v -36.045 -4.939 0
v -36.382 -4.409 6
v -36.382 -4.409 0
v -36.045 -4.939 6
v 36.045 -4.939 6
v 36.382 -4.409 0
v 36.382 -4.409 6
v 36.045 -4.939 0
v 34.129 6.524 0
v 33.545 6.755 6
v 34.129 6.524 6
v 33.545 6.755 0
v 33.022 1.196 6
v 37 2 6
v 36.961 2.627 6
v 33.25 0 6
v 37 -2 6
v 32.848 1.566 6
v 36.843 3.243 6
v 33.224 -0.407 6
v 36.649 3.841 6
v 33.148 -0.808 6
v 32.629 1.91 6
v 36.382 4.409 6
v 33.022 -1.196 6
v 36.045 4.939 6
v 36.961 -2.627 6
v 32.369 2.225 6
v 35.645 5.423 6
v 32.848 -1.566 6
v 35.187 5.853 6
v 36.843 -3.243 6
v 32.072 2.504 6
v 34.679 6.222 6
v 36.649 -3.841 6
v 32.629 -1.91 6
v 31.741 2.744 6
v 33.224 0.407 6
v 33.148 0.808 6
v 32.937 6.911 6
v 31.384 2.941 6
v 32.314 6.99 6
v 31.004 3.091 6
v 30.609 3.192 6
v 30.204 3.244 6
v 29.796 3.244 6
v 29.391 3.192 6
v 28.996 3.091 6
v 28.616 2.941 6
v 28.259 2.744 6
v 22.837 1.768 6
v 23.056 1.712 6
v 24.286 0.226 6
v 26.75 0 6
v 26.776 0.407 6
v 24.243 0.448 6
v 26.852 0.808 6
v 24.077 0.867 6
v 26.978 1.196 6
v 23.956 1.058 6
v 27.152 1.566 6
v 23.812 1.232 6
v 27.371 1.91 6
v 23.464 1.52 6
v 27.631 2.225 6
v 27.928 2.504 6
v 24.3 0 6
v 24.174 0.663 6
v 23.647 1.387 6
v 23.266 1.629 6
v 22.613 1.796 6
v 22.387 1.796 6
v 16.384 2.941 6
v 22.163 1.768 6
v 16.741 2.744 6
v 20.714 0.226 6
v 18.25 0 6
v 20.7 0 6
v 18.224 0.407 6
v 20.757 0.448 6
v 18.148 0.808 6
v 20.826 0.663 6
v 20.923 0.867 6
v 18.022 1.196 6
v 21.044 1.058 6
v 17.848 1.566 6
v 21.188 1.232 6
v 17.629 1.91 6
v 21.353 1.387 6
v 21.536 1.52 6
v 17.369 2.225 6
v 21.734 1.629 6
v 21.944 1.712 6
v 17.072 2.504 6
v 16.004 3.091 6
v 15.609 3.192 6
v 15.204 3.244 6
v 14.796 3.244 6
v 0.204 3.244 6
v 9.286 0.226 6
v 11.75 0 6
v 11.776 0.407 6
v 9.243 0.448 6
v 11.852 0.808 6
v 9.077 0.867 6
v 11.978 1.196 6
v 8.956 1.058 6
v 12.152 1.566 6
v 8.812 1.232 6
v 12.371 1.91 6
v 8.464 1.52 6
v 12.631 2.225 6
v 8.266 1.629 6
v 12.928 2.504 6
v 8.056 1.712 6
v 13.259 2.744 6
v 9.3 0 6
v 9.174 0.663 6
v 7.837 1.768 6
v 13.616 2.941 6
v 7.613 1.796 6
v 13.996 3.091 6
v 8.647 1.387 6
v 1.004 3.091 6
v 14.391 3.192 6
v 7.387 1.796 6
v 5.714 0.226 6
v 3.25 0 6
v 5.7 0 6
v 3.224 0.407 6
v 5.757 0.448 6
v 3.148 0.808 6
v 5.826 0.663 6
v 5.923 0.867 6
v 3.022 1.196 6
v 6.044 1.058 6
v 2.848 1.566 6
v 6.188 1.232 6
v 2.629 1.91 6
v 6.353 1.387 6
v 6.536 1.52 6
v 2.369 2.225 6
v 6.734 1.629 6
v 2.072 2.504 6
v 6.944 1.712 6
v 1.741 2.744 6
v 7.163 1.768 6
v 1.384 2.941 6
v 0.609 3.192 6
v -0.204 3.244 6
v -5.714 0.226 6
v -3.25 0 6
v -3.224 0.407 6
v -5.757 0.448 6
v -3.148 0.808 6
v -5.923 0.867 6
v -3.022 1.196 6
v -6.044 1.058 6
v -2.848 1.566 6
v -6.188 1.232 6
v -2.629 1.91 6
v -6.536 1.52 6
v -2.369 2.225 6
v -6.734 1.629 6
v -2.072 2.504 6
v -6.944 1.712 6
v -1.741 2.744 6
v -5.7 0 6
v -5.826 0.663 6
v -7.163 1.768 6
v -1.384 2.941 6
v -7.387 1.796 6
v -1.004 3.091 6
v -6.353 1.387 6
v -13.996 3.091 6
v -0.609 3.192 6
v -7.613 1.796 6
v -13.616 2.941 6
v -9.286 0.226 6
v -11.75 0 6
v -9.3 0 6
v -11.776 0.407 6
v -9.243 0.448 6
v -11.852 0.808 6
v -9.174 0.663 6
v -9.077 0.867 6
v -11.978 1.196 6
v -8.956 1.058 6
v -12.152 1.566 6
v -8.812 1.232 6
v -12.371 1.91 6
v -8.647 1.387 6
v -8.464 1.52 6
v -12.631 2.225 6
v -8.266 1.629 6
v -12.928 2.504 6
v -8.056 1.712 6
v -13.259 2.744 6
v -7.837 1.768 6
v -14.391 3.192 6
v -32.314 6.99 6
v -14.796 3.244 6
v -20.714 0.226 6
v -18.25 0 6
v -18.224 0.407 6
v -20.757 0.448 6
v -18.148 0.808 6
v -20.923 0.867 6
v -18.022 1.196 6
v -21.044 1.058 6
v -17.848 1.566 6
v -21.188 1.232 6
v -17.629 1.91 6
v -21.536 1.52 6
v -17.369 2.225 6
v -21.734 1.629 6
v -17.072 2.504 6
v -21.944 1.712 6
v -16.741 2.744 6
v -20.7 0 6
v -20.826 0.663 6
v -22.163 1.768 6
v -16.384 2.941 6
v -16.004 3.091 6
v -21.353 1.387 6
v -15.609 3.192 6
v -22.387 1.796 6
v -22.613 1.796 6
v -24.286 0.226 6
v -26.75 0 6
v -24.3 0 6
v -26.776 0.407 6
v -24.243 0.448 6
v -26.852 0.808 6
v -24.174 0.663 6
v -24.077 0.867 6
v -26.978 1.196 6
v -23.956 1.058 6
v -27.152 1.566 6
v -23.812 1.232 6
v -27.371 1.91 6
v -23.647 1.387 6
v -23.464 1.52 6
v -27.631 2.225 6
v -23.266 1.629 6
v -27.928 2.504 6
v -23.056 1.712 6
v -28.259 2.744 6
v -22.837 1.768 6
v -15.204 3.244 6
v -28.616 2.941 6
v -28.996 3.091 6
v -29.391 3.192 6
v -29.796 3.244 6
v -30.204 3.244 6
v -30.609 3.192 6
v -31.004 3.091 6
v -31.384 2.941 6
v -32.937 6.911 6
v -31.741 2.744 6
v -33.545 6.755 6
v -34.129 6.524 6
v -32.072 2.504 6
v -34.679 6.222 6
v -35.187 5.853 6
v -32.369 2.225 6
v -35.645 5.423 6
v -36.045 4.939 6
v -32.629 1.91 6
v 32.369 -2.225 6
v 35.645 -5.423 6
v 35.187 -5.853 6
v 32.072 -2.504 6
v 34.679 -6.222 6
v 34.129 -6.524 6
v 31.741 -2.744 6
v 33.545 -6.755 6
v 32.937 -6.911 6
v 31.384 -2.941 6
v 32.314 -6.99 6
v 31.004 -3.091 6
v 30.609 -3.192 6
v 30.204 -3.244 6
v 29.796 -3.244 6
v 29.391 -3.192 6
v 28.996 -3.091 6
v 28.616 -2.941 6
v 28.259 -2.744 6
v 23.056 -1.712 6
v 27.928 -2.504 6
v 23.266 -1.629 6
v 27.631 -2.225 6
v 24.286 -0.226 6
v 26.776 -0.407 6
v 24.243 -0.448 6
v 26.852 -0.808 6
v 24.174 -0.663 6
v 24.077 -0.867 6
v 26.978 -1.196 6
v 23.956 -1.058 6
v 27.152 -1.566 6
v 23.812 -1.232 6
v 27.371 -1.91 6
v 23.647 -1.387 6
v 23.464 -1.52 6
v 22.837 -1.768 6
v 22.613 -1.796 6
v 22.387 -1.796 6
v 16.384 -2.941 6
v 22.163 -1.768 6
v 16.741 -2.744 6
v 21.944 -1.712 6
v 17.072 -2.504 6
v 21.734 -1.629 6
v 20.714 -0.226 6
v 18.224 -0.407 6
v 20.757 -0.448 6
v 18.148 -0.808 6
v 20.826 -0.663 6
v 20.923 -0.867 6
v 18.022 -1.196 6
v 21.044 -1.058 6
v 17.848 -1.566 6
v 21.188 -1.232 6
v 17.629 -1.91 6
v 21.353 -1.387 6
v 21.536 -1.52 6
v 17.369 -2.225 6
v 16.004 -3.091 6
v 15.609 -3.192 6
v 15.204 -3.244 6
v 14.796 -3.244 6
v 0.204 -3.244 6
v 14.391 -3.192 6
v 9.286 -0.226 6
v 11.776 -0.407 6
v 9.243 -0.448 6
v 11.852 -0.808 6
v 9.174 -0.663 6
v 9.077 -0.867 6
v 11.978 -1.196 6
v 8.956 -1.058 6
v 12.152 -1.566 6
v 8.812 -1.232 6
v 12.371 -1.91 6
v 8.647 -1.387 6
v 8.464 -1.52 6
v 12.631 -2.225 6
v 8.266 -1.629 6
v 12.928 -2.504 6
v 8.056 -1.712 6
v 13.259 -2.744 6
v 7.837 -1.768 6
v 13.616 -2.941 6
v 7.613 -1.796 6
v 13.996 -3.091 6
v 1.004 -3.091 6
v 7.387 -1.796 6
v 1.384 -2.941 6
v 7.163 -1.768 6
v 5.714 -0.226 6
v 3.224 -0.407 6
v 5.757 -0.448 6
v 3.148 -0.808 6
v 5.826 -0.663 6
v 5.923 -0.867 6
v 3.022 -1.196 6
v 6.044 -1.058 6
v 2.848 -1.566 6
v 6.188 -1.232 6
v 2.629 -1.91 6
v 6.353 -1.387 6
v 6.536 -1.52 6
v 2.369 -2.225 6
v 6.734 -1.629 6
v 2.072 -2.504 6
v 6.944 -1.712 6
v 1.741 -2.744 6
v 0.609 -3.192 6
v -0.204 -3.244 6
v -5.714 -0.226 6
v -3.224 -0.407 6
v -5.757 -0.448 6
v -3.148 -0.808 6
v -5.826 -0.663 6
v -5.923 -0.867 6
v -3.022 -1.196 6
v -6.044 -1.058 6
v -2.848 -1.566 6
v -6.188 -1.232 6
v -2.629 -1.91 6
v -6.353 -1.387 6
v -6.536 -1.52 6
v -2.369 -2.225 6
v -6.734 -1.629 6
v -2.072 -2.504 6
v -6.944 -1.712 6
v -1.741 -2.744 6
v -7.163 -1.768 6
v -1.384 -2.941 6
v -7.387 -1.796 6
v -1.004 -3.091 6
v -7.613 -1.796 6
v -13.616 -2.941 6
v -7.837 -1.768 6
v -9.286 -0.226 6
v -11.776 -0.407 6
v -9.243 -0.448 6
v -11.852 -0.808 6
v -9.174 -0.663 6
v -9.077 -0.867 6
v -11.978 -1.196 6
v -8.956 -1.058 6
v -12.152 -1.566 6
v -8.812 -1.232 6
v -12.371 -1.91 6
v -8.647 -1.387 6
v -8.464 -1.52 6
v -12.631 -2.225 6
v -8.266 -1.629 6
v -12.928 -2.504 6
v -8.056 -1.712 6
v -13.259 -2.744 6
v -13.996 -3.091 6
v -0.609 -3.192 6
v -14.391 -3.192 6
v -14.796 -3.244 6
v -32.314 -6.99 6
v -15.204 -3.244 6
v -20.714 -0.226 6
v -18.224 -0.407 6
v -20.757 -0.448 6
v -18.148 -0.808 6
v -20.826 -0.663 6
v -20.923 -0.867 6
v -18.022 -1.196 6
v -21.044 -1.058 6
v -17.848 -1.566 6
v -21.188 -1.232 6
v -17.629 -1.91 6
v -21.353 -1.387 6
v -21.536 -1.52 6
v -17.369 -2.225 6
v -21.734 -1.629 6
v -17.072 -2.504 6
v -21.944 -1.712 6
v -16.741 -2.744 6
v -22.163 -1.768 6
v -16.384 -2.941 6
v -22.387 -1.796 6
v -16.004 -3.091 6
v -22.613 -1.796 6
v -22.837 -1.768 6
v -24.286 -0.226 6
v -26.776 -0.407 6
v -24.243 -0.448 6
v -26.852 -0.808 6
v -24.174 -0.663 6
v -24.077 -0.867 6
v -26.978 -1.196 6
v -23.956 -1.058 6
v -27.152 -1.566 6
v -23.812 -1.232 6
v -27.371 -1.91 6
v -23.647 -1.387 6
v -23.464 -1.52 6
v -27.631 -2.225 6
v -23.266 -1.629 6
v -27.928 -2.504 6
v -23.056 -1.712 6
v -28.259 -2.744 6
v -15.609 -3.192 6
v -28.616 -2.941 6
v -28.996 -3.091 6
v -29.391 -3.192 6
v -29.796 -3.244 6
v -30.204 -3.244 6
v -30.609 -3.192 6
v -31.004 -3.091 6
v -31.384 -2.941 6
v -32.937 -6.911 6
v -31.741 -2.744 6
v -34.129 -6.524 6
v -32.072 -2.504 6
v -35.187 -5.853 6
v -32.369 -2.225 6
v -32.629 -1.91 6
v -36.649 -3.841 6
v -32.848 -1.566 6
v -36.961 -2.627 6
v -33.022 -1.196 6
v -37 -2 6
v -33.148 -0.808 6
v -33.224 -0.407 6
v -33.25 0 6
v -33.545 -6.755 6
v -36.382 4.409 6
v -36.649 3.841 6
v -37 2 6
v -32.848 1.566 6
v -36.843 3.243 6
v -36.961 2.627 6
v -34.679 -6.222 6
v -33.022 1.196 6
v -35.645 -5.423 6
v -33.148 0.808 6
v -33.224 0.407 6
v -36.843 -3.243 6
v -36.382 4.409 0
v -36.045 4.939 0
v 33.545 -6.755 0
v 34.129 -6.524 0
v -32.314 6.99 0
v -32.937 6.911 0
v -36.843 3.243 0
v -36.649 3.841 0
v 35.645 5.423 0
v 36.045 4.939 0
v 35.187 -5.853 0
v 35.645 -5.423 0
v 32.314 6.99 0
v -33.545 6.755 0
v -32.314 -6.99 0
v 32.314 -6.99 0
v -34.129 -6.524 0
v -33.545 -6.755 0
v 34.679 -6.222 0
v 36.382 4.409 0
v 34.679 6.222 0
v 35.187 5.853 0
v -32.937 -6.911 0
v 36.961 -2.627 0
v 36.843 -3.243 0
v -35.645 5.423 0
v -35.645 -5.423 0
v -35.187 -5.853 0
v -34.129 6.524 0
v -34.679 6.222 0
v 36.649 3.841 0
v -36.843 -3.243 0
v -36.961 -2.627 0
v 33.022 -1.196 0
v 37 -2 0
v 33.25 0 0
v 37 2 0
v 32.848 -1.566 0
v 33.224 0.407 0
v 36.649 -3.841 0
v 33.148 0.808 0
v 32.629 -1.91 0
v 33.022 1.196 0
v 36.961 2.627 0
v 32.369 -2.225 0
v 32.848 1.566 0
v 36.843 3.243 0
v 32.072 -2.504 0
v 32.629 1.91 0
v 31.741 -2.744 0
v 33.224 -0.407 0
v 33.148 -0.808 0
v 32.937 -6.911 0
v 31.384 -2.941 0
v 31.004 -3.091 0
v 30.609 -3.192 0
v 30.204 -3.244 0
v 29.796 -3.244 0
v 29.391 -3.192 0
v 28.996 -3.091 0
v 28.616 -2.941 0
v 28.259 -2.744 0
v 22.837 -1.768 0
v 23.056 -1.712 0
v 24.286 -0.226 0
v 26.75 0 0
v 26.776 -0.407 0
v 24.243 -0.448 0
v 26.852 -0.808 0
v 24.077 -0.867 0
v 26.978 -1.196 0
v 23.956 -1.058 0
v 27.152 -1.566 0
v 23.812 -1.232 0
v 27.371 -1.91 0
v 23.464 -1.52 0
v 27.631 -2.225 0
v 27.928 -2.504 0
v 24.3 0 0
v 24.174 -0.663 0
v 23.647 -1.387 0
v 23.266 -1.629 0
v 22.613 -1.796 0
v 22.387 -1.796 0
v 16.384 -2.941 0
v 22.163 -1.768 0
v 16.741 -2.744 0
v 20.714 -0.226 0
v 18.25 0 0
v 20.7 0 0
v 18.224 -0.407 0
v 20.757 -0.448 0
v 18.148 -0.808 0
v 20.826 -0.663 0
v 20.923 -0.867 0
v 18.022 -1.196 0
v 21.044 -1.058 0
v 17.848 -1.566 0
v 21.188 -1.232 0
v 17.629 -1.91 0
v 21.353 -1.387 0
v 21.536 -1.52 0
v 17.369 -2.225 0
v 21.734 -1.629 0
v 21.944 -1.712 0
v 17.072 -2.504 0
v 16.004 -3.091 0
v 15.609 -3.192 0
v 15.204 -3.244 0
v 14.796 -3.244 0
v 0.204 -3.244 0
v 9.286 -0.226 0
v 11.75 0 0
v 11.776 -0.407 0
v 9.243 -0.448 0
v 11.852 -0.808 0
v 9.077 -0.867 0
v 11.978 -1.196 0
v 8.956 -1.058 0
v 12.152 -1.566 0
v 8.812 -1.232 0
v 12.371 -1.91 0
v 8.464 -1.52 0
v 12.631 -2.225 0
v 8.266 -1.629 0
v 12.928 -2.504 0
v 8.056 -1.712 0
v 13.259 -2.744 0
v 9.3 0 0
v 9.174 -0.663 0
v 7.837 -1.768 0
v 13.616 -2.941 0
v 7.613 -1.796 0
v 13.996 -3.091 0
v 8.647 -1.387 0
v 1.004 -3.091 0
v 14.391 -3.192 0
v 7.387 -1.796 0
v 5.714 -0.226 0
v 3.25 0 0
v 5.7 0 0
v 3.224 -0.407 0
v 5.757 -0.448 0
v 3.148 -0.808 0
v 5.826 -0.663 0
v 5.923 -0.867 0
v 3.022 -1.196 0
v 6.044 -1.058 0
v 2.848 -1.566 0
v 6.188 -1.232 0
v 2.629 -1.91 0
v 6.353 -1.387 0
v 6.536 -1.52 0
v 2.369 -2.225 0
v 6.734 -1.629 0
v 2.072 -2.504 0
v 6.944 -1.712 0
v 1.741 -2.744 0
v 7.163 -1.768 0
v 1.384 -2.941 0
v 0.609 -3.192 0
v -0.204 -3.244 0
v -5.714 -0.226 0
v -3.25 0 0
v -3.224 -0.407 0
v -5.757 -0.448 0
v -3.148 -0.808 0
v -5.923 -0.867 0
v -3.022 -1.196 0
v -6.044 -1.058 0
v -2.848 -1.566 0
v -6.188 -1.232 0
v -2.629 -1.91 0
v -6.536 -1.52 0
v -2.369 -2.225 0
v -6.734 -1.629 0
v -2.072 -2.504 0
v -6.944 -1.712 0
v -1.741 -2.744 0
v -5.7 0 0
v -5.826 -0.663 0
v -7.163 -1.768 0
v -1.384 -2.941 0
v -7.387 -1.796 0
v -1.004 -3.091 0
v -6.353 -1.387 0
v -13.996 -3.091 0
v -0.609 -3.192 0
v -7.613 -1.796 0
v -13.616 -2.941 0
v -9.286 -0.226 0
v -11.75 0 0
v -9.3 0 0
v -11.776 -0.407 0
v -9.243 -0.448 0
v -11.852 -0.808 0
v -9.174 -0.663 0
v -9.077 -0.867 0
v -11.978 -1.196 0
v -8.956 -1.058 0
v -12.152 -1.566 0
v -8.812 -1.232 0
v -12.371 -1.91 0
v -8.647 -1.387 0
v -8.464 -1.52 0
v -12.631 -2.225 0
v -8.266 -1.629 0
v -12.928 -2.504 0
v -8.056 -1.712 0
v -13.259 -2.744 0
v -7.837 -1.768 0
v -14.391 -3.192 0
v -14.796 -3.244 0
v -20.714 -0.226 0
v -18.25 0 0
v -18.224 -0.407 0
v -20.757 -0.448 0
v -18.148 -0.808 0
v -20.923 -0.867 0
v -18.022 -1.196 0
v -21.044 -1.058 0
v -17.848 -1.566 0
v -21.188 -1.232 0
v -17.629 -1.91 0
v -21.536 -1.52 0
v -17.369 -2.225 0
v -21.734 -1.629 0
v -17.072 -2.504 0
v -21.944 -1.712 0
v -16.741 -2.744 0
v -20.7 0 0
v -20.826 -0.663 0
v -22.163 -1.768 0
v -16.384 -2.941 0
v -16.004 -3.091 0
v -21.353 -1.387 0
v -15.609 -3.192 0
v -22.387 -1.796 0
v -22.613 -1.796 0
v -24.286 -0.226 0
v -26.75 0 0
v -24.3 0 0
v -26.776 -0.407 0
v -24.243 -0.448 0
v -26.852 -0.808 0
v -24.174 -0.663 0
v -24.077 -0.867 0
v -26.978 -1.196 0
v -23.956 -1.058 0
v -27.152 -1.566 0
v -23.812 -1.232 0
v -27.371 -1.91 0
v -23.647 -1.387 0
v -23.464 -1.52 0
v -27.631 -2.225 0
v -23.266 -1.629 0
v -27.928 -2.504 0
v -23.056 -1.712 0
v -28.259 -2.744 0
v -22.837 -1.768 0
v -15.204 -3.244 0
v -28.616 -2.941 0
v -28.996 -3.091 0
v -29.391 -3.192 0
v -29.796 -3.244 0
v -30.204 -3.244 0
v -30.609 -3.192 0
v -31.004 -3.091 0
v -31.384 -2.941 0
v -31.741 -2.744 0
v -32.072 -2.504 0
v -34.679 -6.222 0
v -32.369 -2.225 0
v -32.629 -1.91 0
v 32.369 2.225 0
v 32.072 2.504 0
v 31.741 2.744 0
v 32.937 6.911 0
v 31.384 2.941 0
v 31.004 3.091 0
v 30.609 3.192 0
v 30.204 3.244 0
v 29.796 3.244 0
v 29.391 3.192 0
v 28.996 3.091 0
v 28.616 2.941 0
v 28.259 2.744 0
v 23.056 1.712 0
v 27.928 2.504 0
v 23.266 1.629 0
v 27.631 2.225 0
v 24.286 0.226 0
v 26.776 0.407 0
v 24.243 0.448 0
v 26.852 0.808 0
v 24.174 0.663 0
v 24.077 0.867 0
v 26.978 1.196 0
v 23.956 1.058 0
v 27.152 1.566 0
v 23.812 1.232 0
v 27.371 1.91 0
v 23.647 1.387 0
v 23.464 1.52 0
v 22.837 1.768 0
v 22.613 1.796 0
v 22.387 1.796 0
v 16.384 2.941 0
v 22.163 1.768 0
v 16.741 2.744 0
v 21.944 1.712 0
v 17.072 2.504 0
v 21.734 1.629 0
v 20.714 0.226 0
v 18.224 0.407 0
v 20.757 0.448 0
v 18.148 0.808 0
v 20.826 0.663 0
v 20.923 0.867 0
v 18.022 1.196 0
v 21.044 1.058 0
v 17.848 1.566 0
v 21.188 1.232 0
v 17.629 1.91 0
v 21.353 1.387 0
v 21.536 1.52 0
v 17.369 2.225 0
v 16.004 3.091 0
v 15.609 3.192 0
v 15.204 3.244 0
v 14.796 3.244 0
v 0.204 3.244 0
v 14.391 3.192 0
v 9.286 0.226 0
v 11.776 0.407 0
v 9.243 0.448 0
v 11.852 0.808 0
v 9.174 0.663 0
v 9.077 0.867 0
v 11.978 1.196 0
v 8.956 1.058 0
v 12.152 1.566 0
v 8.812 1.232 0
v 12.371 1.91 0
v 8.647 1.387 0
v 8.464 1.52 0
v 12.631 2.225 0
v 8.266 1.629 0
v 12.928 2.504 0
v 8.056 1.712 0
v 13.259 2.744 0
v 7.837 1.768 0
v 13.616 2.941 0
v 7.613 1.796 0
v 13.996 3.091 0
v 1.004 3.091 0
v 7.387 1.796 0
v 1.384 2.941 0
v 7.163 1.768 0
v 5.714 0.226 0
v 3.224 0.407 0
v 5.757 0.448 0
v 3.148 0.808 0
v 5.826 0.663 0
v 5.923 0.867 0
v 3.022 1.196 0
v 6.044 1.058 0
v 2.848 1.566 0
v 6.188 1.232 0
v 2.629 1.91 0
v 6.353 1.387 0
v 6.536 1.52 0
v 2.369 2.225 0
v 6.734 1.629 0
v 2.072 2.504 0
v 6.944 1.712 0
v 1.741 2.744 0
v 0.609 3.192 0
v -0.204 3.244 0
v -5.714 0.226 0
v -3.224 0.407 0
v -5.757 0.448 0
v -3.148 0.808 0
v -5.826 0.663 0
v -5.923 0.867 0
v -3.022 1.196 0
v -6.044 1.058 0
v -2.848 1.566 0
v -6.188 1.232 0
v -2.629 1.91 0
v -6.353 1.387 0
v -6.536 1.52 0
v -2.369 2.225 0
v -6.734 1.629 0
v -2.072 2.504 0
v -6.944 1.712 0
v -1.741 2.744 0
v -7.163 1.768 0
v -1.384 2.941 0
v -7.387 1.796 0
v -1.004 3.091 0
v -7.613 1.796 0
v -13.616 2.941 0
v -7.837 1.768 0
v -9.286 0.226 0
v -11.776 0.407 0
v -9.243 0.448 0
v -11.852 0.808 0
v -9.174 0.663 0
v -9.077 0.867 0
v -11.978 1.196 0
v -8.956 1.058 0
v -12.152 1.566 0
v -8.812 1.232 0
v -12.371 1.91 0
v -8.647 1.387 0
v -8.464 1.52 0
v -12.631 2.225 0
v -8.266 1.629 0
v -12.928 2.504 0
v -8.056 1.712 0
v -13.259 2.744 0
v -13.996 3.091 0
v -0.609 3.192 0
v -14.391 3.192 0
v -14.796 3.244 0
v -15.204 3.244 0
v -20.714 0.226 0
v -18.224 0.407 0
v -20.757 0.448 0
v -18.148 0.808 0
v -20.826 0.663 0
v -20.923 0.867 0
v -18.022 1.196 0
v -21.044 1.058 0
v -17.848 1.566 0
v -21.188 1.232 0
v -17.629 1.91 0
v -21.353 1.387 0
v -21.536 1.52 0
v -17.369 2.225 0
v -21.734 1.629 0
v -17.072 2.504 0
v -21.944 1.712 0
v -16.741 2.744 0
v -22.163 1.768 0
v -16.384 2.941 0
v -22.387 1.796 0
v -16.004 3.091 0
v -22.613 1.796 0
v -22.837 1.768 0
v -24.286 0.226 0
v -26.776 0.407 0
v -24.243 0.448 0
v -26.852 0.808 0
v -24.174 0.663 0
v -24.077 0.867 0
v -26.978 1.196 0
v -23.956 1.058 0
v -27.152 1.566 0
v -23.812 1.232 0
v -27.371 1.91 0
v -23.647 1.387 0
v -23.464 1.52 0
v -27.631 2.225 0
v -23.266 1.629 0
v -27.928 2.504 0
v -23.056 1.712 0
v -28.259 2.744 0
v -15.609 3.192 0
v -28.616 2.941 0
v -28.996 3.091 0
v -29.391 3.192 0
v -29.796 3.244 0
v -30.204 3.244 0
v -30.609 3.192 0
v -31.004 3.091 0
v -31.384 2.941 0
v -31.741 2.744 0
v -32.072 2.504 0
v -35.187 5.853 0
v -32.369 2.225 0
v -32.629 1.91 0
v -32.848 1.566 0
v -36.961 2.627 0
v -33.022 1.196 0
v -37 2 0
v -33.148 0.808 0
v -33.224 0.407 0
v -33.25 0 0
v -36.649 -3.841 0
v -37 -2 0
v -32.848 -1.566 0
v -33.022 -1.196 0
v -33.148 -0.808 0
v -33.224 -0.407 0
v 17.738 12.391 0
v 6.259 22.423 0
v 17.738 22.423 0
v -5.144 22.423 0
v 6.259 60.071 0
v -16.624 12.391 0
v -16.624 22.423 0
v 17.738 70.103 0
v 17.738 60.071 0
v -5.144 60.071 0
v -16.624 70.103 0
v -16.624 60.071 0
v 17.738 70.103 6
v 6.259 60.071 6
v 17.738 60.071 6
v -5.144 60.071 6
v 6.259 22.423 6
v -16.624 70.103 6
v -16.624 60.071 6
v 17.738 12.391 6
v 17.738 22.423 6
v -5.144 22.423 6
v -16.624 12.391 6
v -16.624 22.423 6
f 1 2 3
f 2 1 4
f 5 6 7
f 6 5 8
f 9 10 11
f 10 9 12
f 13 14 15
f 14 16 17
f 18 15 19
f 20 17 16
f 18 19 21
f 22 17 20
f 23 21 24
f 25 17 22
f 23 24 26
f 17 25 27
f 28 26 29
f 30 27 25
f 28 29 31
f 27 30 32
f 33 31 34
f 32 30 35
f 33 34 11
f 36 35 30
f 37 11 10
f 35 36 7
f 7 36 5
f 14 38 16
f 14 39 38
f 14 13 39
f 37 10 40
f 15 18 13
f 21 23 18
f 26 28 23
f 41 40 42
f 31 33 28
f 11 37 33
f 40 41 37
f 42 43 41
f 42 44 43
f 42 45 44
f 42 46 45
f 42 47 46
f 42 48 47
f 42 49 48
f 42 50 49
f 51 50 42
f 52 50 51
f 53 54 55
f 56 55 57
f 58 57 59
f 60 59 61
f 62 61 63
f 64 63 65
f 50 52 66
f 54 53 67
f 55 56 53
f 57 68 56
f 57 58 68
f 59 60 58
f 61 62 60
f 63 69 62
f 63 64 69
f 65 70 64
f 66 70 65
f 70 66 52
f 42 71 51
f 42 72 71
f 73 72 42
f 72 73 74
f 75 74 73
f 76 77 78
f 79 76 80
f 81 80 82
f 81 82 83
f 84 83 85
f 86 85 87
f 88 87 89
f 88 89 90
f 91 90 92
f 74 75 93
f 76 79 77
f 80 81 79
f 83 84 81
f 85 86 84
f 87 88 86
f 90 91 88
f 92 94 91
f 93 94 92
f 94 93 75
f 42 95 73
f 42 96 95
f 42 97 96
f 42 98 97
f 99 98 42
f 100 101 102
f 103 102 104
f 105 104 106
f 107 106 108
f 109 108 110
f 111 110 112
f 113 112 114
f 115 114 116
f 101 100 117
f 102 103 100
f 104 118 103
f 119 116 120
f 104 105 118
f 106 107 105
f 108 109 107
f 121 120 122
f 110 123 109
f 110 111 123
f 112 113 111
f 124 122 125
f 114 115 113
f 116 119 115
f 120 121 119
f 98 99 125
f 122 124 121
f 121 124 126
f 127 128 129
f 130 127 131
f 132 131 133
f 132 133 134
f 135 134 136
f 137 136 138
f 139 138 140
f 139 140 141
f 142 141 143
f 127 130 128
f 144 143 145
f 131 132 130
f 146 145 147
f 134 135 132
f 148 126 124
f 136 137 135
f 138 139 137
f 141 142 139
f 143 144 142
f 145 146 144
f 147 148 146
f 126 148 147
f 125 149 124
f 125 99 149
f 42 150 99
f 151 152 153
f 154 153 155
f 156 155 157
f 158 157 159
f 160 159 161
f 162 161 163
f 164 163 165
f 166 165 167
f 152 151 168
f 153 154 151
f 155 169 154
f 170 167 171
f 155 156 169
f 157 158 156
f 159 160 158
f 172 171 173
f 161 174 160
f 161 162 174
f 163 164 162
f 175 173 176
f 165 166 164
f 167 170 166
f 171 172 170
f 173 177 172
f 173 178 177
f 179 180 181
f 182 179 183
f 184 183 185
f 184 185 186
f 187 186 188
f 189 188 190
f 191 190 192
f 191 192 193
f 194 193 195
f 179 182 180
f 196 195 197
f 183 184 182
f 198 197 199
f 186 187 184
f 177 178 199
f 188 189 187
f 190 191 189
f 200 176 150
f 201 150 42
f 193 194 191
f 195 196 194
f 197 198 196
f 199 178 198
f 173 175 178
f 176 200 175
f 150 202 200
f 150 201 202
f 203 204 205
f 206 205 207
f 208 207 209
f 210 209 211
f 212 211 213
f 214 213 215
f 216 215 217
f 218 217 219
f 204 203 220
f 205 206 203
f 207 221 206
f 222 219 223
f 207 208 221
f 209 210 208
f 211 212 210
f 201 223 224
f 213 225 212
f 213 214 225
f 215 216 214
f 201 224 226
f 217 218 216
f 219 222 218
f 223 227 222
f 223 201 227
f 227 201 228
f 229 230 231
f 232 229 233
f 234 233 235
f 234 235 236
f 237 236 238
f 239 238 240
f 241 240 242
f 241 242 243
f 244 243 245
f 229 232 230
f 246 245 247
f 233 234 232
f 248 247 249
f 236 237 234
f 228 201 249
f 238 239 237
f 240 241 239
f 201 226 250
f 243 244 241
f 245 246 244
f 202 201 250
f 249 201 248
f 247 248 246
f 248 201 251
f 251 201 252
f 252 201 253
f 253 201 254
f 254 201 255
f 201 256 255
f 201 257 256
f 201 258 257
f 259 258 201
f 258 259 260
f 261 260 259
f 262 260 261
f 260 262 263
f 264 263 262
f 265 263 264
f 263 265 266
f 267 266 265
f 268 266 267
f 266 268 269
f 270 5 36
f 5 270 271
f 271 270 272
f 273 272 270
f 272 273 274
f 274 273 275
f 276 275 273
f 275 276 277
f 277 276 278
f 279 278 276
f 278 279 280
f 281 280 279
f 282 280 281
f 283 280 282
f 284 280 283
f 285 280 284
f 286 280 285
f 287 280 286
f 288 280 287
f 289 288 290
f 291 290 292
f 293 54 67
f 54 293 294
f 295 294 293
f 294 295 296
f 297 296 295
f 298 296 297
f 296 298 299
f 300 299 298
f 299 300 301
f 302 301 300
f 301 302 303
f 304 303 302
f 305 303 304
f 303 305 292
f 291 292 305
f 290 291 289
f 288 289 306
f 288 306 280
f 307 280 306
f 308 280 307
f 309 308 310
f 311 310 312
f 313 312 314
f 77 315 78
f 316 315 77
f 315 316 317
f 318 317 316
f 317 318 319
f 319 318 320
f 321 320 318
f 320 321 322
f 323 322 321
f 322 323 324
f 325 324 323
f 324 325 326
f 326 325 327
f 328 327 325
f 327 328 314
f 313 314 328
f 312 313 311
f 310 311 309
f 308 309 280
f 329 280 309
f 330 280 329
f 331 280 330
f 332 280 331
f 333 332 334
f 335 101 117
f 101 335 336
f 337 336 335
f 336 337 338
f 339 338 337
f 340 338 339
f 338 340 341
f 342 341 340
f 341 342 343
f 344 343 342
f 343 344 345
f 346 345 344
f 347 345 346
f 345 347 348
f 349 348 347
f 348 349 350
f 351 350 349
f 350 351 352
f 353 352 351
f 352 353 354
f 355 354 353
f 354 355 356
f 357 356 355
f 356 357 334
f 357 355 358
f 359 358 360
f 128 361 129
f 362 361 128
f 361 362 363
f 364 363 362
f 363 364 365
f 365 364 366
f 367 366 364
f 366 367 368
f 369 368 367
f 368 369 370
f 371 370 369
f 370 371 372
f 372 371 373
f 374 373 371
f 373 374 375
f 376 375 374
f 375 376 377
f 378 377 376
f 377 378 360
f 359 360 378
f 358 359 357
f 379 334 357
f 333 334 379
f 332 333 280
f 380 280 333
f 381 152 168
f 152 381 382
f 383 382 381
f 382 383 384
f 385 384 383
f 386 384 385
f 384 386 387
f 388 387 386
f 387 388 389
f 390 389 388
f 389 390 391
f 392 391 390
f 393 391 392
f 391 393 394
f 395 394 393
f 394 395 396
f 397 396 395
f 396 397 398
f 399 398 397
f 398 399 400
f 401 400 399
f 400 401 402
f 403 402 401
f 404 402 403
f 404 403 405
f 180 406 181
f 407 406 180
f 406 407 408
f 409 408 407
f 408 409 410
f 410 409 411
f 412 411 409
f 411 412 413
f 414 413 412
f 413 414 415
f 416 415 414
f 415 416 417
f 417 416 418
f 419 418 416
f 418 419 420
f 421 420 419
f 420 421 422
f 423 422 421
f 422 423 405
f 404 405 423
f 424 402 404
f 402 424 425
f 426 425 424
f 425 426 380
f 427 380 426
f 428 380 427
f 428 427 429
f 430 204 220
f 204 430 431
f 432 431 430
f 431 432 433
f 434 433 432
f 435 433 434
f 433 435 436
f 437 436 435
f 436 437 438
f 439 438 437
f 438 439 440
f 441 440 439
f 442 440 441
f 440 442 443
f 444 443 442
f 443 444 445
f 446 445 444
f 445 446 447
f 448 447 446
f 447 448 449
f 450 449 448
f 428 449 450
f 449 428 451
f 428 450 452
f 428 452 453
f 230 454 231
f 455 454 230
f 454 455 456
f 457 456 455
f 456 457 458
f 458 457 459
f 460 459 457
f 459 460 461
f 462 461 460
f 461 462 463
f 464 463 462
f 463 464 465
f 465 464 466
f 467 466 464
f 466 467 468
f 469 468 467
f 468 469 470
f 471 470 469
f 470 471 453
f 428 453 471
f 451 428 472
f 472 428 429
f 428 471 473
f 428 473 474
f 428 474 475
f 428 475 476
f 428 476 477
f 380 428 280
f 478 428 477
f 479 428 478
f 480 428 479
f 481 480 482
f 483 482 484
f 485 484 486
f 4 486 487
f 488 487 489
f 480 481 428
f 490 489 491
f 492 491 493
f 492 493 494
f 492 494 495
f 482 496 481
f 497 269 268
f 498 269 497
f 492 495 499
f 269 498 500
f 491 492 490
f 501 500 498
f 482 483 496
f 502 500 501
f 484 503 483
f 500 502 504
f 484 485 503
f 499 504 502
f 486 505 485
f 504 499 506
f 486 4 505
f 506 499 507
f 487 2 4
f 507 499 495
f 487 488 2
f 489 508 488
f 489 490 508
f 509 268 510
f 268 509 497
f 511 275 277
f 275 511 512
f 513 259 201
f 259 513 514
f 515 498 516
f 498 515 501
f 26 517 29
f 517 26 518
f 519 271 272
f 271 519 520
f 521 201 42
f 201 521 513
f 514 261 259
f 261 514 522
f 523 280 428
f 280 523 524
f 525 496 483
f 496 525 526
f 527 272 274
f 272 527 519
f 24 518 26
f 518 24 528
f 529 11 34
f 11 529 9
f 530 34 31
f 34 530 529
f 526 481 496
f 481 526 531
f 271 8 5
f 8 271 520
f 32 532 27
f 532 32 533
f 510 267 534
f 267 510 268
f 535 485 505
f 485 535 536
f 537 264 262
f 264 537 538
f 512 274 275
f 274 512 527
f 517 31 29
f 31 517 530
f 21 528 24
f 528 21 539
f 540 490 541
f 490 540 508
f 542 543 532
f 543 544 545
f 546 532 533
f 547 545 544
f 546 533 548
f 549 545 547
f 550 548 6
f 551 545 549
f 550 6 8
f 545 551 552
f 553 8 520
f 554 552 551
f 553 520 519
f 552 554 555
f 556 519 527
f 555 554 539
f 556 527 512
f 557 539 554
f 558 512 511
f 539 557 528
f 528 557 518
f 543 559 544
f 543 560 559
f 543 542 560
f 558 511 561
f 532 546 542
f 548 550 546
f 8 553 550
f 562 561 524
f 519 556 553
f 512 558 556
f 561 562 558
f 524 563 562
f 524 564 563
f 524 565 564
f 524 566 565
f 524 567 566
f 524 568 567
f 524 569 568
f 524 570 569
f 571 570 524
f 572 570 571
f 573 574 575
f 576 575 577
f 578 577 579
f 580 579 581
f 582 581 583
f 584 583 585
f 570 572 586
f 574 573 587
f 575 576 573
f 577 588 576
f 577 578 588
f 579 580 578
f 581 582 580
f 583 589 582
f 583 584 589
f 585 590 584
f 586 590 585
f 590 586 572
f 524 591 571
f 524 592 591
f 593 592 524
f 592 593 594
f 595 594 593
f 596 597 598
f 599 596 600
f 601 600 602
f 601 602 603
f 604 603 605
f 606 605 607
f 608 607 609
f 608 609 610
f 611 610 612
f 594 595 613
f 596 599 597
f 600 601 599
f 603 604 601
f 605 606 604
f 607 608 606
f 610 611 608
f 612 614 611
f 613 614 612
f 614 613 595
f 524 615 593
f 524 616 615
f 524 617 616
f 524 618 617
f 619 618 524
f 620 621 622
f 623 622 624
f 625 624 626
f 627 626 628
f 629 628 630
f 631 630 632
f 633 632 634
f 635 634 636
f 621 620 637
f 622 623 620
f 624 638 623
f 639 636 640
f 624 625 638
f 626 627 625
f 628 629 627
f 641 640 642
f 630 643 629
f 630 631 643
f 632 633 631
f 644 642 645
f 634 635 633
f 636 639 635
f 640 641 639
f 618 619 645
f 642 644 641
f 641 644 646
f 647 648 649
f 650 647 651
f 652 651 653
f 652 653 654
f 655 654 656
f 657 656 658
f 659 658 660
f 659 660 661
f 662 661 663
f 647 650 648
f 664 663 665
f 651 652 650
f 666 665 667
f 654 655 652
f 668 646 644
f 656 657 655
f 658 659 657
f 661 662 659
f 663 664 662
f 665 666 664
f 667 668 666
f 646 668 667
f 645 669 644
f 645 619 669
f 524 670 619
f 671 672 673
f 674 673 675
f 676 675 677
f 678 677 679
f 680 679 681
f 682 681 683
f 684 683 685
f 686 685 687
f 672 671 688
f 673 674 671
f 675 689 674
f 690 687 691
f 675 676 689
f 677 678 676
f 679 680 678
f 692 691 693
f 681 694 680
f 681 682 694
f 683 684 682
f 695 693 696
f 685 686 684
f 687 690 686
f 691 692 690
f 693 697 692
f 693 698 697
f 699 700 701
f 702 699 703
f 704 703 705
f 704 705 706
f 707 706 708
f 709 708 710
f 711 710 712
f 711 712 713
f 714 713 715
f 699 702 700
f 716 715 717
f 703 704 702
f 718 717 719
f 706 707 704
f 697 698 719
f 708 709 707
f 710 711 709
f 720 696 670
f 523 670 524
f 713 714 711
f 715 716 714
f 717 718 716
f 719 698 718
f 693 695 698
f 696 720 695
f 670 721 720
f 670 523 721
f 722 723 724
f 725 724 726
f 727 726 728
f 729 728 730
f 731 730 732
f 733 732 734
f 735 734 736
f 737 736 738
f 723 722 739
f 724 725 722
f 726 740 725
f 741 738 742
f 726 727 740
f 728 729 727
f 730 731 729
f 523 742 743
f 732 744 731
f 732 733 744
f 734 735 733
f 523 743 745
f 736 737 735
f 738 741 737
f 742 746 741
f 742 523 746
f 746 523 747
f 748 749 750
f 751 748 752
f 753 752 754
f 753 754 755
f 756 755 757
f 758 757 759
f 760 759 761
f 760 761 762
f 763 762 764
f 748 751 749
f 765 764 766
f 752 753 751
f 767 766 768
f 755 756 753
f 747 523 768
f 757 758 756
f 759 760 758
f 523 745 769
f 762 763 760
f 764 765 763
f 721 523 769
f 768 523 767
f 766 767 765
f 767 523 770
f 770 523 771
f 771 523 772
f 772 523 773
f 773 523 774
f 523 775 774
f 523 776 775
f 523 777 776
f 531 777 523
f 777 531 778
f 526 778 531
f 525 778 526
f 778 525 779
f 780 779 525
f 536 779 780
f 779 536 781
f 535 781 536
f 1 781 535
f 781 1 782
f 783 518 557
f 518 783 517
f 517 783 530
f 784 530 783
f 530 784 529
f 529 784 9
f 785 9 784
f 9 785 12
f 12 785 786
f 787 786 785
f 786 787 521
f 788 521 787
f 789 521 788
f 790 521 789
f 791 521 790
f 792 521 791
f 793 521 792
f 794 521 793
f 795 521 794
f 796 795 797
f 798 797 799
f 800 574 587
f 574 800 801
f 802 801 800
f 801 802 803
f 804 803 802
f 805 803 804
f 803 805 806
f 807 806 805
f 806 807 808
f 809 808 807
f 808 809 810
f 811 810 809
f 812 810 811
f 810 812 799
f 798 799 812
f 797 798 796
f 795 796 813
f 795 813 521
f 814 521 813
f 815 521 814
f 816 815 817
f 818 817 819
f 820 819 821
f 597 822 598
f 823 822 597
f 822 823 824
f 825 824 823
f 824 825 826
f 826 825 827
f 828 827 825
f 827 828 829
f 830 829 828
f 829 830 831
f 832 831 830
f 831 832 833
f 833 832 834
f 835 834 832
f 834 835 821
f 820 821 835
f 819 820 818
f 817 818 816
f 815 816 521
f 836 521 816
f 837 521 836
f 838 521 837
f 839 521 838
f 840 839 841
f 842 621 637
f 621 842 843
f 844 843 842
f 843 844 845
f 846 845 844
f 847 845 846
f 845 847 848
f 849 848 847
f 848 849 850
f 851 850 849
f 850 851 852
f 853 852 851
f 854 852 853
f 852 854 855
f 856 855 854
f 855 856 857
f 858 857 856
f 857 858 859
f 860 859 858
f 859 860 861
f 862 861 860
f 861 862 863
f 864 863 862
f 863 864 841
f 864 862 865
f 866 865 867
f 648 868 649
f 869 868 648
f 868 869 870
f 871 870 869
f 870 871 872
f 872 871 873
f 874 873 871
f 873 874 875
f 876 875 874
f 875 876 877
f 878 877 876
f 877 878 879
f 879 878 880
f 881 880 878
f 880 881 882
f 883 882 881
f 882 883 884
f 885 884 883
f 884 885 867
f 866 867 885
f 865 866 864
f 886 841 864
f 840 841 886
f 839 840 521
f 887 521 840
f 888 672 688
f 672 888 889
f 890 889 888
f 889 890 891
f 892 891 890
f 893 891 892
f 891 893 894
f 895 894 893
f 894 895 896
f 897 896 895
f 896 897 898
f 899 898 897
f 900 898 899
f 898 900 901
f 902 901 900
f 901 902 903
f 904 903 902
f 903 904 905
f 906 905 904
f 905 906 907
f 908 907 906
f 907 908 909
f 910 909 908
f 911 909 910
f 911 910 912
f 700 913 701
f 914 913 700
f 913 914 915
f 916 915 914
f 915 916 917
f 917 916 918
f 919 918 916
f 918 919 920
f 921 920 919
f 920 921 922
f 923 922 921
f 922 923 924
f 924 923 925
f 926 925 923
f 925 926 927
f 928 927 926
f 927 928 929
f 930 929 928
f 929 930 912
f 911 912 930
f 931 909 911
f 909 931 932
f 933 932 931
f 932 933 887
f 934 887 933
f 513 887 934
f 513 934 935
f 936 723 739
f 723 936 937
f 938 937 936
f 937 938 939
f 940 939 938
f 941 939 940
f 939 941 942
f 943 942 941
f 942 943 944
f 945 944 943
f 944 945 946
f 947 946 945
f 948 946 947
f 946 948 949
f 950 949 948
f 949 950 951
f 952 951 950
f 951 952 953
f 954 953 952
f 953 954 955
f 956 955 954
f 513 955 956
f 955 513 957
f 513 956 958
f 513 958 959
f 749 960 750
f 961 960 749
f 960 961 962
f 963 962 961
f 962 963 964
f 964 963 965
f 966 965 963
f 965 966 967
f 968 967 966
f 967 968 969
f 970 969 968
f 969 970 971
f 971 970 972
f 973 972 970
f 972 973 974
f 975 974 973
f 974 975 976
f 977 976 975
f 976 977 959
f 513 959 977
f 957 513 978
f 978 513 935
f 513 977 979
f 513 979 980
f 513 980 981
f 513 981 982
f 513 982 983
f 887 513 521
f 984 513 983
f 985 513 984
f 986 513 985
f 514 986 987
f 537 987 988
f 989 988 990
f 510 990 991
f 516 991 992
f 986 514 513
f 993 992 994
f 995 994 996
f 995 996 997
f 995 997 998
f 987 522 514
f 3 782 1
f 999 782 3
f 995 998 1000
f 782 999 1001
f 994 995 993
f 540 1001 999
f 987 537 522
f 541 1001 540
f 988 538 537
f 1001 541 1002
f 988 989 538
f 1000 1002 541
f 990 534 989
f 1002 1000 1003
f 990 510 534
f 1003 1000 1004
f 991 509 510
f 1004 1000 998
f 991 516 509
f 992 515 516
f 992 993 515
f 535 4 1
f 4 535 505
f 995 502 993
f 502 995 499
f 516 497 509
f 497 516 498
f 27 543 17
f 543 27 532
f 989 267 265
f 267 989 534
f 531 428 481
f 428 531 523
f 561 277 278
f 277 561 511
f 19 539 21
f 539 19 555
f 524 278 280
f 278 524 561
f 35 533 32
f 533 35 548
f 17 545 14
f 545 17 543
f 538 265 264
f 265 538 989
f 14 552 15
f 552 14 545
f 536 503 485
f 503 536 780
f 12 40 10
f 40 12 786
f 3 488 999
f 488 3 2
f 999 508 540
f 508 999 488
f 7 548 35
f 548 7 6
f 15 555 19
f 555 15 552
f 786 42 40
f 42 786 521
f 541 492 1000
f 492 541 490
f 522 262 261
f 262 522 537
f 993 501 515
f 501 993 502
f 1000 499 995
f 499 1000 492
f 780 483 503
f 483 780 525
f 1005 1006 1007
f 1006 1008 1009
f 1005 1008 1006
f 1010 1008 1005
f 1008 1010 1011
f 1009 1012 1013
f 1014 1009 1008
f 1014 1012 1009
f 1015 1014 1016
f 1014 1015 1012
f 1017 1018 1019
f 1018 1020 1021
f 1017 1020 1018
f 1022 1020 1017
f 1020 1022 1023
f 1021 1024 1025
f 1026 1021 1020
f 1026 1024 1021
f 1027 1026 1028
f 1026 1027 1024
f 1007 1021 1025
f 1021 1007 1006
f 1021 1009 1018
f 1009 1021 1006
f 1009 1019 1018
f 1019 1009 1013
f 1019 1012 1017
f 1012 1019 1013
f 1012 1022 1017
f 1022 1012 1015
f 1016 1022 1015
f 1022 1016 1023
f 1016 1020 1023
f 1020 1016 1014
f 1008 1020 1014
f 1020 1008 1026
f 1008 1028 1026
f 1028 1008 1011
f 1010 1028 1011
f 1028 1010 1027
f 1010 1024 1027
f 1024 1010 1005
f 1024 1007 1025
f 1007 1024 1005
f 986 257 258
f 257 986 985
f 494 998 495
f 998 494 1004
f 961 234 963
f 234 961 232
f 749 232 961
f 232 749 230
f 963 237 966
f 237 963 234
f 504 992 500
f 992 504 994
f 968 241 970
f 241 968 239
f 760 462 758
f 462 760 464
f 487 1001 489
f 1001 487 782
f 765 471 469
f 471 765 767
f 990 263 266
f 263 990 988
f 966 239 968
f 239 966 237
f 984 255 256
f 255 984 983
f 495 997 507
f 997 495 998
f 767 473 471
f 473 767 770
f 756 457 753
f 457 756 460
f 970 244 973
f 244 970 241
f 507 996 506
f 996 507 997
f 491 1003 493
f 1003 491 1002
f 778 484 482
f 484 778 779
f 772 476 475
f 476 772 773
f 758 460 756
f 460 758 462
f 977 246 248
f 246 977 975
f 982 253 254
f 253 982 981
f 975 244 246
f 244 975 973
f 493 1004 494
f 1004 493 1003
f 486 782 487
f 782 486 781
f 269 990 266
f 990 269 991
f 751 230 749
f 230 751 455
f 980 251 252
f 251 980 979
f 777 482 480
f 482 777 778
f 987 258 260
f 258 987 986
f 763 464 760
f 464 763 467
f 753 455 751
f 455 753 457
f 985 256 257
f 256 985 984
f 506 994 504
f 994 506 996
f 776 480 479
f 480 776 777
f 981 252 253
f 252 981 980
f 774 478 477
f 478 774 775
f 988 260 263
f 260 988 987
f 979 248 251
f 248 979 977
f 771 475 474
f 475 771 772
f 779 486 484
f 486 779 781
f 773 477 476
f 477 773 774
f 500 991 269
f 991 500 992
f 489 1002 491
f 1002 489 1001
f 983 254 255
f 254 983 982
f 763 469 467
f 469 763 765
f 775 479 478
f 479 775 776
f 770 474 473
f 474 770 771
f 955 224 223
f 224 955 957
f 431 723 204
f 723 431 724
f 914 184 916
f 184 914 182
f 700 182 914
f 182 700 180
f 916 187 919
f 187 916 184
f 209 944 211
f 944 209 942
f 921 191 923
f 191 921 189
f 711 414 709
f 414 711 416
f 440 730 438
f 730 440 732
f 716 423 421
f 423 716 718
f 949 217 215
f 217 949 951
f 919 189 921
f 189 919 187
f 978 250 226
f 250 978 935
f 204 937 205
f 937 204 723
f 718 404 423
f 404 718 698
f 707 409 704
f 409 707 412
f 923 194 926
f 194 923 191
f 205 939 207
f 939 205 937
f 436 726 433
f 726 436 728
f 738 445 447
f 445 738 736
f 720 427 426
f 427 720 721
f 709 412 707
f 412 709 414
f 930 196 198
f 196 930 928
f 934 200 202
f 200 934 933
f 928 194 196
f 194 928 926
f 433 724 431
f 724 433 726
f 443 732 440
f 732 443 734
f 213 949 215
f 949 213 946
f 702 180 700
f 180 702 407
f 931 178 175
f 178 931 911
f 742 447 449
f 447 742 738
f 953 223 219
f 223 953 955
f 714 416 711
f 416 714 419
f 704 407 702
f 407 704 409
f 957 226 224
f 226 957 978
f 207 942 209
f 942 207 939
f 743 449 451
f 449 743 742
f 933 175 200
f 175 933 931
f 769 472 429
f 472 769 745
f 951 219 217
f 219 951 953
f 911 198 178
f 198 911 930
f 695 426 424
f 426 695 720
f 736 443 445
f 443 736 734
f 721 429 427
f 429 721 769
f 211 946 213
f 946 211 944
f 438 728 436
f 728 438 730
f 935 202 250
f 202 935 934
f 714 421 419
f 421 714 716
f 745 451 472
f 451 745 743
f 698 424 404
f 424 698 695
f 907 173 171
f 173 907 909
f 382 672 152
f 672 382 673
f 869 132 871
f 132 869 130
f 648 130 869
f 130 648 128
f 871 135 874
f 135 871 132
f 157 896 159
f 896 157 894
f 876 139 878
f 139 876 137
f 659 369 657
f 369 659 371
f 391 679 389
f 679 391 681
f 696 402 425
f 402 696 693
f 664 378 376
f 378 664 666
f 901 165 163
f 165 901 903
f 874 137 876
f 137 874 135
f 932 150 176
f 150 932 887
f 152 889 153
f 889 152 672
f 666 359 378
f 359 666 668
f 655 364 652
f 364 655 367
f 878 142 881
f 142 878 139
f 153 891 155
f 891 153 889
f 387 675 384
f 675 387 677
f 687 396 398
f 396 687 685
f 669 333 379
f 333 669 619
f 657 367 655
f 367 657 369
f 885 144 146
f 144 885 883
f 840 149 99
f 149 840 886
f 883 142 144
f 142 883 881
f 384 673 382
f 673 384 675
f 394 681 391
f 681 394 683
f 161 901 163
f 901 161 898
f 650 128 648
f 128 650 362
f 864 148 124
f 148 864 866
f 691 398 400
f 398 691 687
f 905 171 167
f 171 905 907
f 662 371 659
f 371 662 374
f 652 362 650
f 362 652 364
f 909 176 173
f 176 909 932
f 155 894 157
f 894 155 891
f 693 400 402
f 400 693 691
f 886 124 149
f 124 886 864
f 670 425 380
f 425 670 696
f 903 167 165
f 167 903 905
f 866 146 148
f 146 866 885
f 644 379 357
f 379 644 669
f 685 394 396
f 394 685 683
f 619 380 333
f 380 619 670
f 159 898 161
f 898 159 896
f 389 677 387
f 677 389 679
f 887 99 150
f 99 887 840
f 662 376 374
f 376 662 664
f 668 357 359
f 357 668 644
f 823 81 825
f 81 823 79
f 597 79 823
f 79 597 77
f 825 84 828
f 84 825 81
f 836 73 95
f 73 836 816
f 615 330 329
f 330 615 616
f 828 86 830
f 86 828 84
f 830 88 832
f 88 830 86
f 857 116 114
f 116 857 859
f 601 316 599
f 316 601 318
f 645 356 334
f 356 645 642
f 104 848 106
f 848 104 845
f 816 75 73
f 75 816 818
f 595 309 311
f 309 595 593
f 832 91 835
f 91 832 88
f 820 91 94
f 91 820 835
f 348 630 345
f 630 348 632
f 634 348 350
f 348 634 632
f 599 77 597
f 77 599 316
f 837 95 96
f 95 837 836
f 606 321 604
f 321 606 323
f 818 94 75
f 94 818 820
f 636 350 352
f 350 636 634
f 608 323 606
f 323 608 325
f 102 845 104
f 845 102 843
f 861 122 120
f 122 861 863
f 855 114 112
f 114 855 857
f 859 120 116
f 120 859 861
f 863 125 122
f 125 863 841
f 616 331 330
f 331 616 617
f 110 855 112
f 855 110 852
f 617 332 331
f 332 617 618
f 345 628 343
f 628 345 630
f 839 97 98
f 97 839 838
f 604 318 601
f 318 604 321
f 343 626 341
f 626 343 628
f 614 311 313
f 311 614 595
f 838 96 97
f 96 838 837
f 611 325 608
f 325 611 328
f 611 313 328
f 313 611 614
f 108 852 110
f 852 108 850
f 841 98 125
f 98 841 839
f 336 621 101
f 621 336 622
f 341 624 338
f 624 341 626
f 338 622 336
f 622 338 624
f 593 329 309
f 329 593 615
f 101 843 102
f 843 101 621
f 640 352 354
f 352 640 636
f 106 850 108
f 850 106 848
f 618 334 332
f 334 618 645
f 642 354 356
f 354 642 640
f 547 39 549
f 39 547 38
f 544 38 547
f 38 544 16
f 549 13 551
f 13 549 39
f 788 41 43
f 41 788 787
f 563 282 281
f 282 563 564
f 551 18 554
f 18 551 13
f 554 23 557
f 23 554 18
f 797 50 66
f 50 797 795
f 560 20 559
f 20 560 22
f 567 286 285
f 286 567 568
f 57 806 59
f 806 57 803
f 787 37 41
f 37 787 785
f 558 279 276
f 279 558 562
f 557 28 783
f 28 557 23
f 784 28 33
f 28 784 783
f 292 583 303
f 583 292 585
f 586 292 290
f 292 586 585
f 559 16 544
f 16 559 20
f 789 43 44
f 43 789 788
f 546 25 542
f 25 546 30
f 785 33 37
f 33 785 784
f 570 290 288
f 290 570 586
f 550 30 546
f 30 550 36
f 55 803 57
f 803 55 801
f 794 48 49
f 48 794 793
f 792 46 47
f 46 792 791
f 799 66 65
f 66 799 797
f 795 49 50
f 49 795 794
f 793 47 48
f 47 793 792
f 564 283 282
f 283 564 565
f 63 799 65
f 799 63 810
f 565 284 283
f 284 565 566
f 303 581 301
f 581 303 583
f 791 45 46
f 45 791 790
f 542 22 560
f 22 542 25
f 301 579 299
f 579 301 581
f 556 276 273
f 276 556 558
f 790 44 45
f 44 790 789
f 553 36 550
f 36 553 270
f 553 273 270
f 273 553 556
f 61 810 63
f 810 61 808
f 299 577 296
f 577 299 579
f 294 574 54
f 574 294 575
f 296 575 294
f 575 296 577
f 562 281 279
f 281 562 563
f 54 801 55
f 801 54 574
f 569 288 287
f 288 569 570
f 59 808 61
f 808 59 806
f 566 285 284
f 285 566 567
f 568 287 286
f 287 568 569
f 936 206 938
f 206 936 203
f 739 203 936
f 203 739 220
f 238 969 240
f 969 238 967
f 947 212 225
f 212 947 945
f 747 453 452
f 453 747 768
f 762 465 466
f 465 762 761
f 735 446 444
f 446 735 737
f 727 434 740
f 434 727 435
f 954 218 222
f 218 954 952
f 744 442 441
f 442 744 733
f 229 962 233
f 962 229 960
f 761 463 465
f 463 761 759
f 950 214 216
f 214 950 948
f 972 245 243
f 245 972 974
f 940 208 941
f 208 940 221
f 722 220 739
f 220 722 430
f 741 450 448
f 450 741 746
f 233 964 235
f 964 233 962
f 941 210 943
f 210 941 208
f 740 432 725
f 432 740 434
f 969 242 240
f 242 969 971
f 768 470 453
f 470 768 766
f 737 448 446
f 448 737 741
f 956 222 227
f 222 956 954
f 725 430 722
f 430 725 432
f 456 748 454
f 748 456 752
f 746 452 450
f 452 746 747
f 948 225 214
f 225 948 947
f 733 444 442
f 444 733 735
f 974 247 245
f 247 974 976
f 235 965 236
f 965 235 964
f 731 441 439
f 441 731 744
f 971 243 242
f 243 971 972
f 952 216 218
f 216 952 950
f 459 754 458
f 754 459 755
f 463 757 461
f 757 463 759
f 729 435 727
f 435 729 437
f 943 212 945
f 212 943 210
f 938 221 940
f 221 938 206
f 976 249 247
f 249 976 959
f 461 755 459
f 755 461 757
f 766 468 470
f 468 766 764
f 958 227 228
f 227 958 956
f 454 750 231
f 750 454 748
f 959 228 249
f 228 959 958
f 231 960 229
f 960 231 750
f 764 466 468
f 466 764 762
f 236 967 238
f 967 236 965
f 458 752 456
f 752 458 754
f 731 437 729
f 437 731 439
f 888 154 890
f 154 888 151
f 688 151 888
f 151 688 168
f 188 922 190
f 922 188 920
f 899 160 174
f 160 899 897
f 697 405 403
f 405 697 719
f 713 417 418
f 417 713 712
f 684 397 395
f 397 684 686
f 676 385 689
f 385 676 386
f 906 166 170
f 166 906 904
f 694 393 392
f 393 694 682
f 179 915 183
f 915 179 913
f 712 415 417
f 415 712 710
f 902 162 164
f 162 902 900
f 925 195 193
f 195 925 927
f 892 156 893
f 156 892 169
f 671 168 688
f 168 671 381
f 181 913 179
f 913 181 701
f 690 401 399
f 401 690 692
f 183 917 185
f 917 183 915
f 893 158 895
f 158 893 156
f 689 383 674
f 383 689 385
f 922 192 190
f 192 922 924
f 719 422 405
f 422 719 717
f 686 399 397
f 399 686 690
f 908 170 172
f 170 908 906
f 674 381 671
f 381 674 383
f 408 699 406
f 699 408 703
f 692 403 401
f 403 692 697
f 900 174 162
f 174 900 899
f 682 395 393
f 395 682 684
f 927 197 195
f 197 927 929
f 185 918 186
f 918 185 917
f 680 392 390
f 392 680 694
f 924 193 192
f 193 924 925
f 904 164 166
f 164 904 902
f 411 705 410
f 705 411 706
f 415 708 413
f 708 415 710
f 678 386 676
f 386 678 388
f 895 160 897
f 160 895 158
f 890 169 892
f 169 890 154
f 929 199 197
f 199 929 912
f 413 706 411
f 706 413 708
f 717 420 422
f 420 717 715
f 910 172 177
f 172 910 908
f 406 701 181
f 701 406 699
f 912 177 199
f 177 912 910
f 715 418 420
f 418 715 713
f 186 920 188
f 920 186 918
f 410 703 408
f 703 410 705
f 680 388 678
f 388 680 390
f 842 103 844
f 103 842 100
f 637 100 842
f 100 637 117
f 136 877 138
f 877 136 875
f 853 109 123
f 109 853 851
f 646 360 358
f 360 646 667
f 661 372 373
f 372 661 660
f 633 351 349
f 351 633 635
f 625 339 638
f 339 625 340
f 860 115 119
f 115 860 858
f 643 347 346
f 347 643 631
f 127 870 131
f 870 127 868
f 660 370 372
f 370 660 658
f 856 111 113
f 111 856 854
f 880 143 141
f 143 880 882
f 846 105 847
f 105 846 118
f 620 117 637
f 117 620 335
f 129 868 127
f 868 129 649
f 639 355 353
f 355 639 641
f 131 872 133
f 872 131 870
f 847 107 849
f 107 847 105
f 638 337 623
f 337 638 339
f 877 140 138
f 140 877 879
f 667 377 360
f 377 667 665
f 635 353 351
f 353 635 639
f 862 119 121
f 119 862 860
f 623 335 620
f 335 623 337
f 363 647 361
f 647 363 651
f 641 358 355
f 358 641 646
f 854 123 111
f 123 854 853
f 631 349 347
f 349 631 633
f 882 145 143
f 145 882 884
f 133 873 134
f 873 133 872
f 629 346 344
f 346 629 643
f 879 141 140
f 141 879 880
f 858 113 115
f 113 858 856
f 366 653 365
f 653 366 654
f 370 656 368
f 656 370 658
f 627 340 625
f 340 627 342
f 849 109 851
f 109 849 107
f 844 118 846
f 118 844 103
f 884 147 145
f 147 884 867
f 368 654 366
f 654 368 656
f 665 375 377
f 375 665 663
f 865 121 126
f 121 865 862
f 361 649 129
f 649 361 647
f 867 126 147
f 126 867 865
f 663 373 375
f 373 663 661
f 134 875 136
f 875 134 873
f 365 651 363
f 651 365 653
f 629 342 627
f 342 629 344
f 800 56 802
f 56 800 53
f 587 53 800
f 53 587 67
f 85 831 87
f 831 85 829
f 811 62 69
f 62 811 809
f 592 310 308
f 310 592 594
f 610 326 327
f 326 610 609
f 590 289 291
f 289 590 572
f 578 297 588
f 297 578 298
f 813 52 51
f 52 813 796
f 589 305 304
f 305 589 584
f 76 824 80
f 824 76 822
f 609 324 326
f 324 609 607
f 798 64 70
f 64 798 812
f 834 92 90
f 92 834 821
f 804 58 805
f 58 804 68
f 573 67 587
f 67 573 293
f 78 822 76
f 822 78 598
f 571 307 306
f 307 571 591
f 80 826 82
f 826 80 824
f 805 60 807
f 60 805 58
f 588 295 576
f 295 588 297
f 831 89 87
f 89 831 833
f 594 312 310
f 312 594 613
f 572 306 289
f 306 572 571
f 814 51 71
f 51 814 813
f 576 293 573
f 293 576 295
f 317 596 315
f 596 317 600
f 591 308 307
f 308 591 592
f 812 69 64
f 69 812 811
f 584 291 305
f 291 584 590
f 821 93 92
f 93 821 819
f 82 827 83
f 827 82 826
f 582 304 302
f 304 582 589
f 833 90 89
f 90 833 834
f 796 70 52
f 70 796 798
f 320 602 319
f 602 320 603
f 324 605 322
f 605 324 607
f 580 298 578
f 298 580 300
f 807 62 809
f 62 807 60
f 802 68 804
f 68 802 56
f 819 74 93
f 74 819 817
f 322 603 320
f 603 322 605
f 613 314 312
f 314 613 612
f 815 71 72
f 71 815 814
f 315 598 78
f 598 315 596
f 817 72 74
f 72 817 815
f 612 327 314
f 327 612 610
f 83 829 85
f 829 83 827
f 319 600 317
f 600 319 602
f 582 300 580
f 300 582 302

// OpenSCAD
$fn = 50;


difference() {
	union() {
		hull() {
			translate(v = [-32.0000000000, 2.0000000000, 0]) {
				cylinder(h = 6, r = 5);
			}
			translate(v = [32.0000000000, 2.0000000000, 0]) {
				cylinder(h = 6, r = 5);
			}
			translate(v = [-32.0000000000, -2.0000000000, 0]) {
				cylinder(h = 6, r = 5);
			}
			translate(v = [32.0000000000, -2.0000000000, 0]) {
				cylinder(h = 6, r = 5);
			}
		}
		translate(v = [0, 68.7500000000, 0]) {
			linear_extrude(height = 6) {
				text(font = "DejaVu Sans Mono:style=Bold", halign = "center", size = 57.0000000000, text = "I", valign = "top");
			}
		}
	}
	union() {
		translate(v = [-30.0000000000, 0.0000000000, 0]) {
			translate(v = [0, 0, -100]) {
				cylinder(h = 200, r = 3.2500000000);
			}
		}
		translate(v = [-15.0000000000, 0.0000000000, 0]) {
			translate(v = [0, 0, -100]) {
				cylinder(h = 200, r = 3.2500000000);
			}
		}
		translate(v = [0, 0, -100]) {
			cylinder(h = 200, r = 3.2500000000);
		}
		translate(v = [15.0000000000, 0.0000000000, 0]) {
			translate(v = [0, 0, -100]) {
				cylinder(h = 200, r = 3.2500000000);
			}
		}
		translate(v = [30.0000000000, 0.0000000000, 0]) {
			translate(v = [0, 0, -100]) {
				cylinder(h = 200, r = 3.2500000000);
			}
		}
		translate(v = [-30.0000000000, 0.0000000000, 0]) {
			translate(v = [0, 0, -100]) {
				cylinder(h = 200, r = 1.8000000000);
			}
		}
		translate(v = [-22.5000000000, 0.0000000000, 0]) {
			translate(v = [0, 0, -100]) {
				cylinder(h = 200, r = 1.8000000000);
			}
		}
		translate(v = [-15.0000000000, 0.0000000000, 0]) {
			translate(v = [0, 0, -100]) {
				cylinder(h = 200, r = 1.8000000000);
			}
		}
		translate(v = [-7.5000000000, 0.0000000000, 0]) {
			translate(v = [0, 0, -100]) {
				cylinder(h = 200, r = 1.8000000000);
			}
		}
		translate(v = [0, 0, -100]) {
			cylinder(h = 200, r = 1.8000000000);
		}
		translate(v = [7.5000000000, 0.0000000000, 0]) {
			translate(v = [0, 0, -100]) {
				cylinder(h = 200, r = 1.8000000000);
			}
		}
		translate(v = [15.0000000000, 0.0000000000, 0]) {
			translate(v = [0, 0, -100]) {
				cylinder(h = 200, r = 1.8000000000);
			}
		}
		translate(v = [22.5000000000, 0.0000000000, 0]) {
			translate(v = [0, 0, -100]) {
				cylinder(h = 200, r = 1.8000000000);
			}
		}
		translate(v = [30.0000000000, 0.0000000000, 0]) {
			translate(v = [0, 0, -100]) {
				cylinder(h = 200, r = 1.8000000000);
			}
		}
	}
}
